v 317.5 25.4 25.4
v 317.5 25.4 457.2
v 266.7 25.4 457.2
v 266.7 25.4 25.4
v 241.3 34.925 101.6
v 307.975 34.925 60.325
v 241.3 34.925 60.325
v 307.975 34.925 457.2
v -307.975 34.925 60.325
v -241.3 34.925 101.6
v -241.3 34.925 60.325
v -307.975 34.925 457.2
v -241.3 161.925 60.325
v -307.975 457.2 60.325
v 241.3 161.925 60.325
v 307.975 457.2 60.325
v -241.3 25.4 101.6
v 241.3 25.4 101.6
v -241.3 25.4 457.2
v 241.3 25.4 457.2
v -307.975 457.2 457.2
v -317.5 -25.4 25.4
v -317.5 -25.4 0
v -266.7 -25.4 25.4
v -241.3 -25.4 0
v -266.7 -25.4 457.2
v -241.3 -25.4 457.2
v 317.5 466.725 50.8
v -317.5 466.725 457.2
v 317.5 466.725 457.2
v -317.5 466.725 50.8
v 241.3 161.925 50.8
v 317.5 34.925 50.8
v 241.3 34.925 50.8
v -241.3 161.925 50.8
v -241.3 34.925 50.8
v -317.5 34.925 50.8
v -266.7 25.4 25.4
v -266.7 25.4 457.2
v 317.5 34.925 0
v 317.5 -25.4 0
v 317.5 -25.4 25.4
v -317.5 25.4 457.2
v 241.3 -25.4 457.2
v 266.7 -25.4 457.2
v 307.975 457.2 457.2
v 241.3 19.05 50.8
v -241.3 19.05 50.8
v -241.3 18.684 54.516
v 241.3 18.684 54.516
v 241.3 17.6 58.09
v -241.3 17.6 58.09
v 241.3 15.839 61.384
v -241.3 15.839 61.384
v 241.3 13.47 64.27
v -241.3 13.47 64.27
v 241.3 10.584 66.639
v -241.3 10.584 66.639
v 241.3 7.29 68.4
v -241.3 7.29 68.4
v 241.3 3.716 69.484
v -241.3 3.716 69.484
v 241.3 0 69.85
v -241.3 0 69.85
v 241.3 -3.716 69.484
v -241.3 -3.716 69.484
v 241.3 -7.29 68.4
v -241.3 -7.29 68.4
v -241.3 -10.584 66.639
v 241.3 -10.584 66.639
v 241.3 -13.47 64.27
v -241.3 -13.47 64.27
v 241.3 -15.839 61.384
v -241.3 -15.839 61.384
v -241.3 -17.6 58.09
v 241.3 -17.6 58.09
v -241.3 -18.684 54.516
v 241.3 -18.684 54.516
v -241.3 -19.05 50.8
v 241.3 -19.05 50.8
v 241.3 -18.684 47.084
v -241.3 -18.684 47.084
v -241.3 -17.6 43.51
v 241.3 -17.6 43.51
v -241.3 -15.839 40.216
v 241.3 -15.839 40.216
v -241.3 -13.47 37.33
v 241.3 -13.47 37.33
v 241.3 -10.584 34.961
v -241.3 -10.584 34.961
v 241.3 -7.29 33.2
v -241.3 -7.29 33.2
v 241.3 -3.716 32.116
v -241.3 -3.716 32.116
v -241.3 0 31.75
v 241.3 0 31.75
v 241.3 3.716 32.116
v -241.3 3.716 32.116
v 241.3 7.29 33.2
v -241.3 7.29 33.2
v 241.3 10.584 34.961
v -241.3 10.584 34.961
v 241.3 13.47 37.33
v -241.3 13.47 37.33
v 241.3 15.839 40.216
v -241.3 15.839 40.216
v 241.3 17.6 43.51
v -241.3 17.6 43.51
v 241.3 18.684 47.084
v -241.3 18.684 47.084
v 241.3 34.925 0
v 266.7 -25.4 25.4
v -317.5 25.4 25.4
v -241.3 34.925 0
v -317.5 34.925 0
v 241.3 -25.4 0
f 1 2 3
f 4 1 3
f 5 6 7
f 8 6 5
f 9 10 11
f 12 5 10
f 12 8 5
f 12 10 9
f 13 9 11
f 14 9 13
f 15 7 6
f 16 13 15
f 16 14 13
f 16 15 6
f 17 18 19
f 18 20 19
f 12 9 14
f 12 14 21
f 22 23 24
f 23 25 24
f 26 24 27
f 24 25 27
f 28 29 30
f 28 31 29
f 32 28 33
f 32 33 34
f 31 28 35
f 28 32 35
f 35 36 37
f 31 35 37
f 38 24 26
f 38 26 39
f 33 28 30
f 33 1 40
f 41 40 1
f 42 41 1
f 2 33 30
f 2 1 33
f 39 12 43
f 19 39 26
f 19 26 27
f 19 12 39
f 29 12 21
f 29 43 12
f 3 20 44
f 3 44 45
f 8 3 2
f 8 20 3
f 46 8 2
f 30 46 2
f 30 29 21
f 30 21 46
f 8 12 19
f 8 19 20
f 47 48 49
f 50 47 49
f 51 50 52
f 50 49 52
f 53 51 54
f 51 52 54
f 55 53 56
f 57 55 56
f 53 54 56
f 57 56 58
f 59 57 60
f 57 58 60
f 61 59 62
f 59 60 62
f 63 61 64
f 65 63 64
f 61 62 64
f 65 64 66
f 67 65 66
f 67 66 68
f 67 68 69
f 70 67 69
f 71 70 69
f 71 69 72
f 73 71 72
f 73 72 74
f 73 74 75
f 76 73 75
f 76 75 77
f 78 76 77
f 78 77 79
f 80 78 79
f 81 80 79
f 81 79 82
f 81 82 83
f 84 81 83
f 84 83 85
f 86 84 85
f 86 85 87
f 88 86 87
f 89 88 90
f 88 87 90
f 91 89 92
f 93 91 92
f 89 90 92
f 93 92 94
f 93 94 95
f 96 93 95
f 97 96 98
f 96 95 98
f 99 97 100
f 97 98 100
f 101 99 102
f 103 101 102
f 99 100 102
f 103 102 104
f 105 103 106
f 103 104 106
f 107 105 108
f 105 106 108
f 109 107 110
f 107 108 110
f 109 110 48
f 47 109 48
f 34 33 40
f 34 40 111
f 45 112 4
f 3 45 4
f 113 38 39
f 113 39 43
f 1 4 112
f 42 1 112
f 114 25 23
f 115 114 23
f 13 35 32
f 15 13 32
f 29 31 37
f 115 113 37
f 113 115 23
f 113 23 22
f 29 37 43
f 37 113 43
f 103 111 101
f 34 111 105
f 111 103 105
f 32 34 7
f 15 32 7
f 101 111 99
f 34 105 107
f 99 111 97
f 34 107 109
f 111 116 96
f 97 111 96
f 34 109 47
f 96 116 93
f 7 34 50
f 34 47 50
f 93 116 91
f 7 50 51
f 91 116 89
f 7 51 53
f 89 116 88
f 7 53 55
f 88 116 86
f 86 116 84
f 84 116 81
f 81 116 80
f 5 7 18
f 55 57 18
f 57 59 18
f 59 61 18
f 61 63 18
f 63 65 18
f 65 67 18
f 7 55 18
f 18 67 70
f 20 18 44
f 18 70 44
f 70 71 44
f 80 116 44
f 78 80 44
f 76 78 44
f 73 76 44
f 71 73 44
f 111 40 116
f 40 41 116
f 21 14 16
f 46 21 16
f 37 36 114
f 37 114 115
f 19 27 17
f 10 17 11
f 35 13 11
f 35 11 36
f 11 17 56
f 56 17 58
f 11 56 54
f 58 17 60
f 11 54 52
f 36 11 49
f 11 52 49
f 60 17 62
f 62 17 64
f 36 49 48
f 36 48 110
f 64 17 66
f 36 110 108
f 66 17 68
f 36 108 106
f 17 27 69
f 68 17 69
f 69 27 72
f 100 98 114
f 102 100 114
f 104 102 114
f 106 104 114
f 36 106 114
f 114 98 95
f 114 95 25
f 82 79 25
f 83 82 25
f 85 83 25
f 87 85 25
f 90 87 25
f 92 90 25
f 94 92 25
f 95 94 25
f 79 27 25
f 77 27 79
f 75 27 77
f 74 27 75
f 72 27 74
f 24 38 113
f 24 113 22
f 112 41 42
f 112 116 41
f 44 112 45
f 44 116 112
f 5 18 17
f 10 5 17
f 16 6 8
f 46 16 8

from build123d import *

# Parameters (mm, degrees)
F0_W      = 25.4
F0_H      = 50.8
F1_DEPTH  = 457.2
F2_W      = 50.8
F2_H      = 25.4
F3_DEPTH  = 50.8
F4_R      = 19.05
F5_DEPTH  = 241.3
F7_W      = 50.8
F7_H      = 431.8
F8_DEPTH  = 9.525
F11_DEPTH = 9.525
F12_W     = 9.525
F12_H     = 406.4
F13_DEPTH = 431.8
F14_W     = 615.95
F14_H     = 9.525
F15_DEPTH = 396.875


# Not quite as in the source:
# - a feature names something its author has since deleted; it is built from what else it names


with BuildPart() as f1:
    # F0 (on Top) → F1 (new body)
    with BuildSketch(Plane.XY):
        with Locations((-254, 0)):
            Rectangle(F0_W, F0_H)
    extrude(amount=F1_DEPTH)

    # F2 (on face) → F3 (join)
    with BuildSketch(Plane(origin=(-266.7, 0, 0), x_dir=(0, -1, 0), z_dir=(-1, 0, 0))):
        with Locations((0, 12.7)):
            Rectangle(F2_W, F2_H)
    extrude(amount=F3_DEPTH)

    # F4 (on face) → F5 (join)
    with BuildSketch(Plane.YZ.offset(-241.3)):
        with Locations((0, 50.8)):
            Circle(F4_R)
    extrude(amount=F5_DEPTH)

    # F6: F1 across plane


with BuildPart() as f1_1:
    add(f1.part)
    add(f1.part.mirror(Plane.YZ))

    # F7 (on face) → F8 (join)
    with BuildSketch(Plane(origin=(0, 25.4, 0), x_dir=(-1, 0, 0), z_dir=(0, 1, 0))):
        Polygon((241.3, 0), (317.5, 0), (317.5, 25.4), (266.7, 25.4), (266.7, 457.2), (241.3, 457.2), (241.3, 101.6), align=None)
        with Locations((292.1, 241.3)):
            Rectangle(F7_W, F7_H)
        Polygon((0, 101.6), (241.3, 101.6), (241.3, 457.2), (0, 457.2), (-241.3, 457.2), (-241.3, 101.6), align=None)
        Polygon((-241.3, 0), (-241.3, 101.6), (-241.3, 457.2), (-317.5, 457.2), (-317.5, 0), align=None)
    extrude(amount=F8_DEPTH)

    # F10 (on offset) → F11 (join)
    with BuildSketch(Plane.XY.offset(50.8)):
        Polygon((-307.975, 34.925), (-241.3, 34.925), (-241.3, 161.925), (241.3, 161.925), (241.3, 34.925), (307.975, 34.925), (307.975, 466.725), (-307.975, 466.725), align=None)
    extrude(amount=F11_DEPTH)

    # F12 (on face) → F13 (join)
    with BuildSketch(Plane(origin=(0, 34.925, 0), x_dir=(-1, 0, 0), z_dir=(0, 1, 0))):
        with Locations((-312.7375, 254)):
            Rectangle(F12_W, F12_H)
        with Locations((312.7375, 254)):
            Rectangle(F12_W, F12_H)
    extrude(amount=F13_DEPTH)

    # F14 (on face) → F15 (join, through all)
    with BuildSketch(Plane.XY.offset(60.325)):
        with Locations((0, 461.9625)):
            Rectangle(F14_W, F14_H)
    extrude(amount=F15_DEPTH)


solid = f1_1.part
